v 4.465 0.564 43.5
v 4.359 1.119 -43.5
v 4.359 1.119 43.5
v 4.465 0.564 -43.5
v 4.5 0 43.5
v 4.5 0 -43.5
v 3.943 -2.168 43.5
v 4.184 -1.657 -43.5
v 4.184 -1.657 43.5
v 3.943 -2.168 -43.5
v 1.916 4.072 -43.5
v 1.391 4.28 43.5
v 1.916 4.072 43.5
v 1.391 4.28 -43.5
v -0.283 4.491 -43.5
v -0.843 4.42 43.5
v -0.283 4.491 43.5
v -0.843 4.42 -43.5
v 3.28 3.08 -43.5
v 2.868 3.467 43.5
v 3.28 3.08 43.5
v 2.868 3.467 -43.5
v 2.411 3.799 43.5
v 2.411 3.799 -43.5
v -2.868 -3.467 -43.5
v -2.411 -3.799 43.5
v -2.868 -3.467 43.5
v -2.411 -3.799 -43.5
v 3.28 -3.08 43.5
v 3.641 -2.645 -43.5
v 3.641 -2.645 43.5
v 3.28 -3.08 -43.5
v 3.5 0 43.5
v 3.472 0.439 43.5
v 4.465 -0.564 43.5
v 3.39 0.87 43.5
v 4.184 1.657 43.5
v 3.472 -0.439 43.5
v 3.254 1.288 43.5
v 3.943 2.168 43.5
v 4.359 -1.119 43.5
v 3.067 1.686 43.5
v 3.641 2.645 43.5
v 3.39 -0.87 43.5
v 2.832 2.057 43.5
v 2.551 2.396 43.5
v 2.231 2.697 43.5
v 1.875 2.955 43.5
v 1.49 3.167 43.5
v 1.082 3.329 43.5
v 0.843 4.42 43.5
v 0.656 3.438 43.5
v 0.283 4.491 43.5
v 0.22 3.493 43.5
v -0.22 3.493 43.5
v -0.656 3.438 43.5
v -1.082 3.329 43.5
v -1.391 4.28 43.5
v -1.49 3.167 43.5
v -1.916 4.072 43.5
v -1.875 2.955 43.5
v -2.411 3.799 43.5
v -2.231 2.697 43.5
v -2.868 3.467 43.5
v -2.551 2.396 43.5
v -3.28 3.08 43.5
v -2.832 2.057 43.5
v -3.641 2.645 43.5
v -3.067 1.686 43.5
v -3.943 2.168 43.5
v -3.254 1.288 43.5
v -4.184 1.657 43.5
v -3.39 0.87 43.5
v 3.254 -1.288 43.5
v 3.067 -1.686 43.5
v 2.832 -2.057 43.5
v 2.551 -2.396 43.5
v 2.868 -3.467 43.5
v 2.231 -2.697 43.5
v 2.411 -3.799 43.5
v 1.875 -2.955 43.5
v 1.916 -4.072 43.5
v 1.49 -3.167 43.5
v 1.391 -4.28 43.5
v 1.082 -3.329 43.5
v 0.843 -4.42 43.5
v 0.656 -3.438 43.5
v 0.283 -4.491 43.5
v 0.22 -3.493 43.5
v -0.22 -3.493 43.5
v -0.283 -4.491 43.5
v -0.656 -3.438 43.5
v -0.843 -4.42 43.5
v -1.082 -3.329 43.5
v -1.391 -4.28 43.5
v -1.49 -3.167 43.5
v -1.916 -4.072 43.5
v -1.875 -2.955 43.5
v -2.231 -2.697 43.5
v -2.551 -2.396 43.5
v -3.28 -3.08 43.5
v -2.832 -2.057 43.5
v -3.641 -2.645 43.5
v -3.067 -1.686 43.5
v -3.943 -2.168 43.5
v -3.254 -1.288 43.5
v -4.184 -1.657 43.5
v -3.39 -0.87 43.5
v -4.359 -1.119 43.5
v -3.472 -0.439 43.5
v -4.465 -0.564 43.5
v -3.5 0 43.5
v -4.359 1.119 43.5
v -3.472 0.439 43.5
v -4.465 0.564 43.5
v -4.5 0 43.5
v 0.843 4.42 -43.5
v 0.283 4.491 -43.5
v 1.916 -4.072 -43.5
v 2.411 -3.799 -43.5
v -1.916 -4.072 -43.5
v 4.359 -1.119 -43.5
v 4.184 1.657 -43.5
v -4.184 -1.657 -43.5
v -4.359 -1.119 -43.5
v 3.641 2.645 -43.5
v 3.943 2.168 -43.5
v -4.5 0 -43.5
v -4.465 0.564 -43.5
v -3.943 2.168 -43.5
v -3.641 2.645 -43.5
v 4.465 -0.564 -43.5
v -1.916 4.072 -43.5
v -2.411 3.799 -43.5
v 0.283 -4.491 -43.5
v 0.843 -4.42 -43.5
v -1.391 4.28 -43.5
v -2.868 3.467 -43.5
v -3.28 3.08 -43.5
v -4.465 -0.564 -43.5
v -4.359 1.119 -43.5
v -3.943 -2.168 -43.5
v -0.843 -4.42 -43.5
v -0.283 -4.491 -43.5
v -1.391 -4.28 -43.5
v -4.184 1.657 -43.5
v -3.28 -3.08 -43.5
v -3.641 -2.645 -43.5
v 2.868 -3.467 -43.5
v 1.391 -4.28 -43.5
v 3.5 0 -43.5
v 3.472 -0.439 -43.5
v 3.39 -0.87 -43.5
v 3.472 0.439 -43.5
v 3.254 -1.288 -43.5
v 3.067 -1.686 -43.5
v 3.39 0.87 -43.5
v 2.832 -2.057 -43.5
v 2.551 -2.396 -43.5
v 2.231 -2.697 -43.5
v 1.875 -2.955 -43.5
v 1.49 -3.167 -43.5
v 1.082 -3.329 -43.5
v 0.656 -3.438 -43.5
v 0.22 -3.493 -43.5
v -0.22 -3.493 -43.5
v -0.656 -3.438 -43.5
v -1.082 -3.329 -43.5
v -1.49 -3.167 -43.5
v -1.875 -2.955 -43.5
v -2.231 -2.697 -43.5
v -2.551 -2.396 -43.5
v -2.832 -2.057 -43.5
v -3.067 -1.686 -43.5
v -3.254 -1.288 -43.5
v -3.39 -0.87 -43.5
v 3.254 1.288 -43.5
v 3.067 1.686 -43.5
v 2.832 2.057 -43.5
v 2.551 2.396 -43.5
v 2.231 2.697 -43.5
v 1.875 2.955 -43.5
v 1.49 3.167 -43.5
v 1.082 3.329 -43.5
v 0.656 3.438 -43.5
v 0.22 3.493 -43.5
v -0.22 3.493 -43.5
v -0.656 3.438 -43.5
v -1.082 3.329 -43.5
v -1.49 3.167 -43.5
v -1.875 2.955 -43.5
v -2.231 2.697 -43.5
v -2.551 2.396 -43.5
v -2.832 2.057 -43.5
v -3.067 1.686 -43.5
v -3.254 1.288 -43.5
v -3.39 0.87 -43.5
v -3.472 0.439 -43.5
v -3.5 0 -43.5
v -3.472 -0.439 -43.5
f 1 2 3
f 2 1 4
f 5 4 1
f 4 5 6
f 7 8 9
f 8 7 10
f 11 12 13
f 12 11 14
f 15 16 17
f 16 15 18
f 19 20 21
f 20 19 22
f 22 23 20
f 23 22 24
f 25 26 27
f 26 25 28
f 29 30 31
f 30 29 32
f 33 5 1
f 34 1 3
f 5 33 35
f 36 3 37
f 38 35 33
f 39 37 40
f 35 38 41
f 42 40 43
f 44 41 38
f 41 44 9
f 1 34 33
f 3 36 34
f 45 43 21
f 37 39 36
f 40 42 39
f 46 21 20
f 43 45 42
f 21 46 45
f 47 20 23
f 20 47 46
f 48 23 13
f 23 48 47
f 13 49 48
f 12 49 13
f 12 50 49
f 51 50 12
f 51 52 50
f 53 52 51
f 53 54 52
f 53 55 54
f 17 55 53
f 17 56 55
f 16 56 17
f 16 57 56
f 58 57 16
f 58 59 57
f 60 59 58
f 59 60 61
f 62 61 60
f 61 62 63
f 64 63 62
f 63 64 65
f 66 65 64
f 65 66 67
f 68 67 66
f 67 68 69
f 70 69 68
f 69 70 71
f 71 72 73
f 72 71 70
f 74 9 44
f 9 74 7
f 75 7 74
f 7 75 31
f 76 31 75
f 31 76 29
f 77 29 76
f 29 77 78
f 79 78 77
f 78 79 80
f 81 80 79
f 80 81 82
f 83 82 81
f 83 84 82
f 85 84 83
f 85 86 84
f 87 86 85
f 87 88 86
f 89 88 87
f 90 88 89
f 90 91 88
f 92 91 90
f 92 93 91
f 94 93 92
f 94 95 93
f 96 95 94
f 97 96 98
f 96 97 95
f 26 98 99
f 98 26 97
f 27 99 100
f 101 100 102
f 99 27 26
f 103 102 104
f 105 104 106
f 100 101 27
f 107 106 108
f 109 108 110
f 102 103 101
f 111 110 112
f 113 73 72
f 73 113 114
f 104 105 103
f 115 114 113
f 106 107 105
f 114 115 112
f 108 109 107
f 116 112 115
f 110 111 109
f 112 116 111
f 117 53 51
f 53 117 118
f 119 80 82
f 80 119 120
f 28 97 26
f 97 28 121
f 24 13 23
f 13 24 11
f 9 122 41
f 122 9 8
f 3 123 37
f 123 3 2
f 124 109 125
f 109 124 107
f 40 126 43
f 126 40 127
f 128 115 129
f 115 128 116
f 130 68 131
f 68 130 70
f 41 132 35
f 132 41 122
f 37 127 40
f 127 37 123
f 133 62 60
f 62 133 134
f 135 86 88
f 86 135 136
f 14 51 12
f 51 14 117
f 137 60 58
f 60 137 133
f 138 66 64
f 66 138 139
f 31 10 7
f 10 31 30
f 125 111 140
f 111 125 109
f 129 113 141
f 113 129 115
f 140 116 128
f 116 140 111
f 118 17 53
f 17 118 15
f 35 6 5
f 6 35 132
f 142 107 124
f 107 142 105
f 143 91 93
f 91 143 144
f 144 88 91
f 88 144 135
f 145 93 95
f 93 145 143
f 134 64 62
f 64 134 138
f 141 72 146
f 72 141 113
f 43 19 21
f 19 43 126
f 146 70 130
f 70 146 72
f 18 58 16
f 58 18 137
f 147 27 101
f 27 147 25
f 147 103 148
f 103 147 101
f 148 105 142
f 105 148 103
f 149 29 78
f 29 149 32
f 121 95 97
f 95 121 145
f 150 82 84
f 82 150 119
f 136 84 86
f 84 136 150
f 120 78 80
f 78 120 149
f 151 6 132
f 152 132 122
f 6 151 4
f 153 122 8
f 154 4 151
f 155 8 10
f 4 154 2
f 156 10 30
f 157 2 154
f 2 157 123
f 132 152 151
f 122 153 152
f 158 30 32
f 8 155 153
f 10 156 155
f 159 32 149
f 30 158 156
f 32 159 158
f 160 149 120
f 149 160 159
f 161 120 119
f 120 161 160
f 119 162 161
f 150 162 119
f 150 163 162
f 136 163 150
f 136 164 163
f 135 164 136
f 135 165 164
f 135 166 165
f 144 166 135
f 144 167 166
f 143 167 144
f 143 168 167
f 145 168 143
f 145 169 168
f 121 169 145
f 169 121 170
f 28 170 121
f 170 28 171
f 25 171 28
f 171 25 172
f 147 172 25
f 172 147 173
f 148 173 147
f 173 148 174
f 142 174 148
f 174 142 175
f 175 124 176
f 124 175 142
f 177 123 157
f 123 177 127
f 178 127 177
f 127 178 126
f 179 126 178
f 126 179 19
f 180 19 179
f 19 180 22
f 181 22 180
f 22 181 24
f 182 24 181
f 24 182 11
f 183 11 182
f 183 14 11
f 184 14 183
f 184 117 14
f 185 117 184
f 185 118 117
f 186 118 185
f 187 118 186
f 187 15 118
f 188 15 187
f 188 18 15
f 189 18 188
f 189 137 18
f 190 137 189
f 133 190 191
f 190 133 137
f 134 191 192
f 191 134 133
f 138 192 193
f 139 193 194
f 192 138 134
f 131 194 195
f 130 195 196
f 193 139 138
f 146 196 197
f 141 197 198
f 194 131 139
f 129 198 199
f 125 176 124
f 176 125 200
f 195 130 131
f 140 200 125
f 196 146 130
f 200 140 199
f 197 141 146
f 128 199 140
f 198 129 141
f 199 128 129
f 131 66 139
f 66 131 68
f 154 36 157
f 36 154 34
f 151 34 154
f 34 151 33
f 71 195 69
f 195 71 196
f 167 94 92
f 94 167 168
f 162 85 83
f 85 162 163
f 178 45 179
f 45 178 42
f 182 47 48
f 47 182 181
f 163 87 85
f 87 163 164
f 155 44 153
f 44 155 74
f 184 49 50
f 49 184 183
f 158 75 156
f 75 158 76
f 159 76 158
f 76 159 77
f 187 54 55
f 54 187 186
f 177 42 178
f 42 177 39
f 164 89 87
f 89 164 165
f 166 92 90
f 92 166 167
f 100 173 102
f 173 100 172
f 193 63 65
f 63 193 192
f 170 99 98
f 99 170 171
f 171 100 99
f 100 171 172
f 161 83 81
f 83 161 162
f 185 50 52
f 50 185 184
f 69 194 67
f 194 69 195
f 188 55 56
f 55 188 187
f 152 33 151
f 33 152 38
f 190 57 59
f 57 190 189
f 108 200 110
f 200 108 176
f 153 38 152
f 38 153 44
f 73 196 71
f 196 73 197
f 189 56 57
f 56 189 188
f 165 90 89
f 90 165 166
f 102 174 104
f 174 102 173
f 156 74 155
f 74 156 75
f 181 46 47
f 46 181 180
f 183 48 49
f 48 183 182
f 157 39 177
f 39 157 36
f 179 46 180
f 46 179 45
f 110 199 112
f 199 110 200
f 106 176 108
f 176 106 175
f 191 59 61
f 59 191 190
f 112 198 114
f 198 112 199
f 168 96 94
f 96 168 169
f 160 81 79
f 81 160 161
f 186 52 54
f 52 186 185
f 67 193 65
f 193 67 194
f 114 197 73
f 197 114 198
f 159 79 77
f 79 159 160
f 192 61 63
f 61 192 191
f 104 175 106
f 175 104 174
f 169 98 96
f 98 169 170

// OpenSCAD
$fn = 50;


difference() {
	union() {
		translate(v = [0, 0, -43.5000000000]) {
			cylinder(h = 87, r = 4.5000000000);
		}
	}
	union() {
		translate(v = [0, 0, -100.0000000000]) {
			cylinder(h = 200, r = 3.5000000000);
		}
	}
}
